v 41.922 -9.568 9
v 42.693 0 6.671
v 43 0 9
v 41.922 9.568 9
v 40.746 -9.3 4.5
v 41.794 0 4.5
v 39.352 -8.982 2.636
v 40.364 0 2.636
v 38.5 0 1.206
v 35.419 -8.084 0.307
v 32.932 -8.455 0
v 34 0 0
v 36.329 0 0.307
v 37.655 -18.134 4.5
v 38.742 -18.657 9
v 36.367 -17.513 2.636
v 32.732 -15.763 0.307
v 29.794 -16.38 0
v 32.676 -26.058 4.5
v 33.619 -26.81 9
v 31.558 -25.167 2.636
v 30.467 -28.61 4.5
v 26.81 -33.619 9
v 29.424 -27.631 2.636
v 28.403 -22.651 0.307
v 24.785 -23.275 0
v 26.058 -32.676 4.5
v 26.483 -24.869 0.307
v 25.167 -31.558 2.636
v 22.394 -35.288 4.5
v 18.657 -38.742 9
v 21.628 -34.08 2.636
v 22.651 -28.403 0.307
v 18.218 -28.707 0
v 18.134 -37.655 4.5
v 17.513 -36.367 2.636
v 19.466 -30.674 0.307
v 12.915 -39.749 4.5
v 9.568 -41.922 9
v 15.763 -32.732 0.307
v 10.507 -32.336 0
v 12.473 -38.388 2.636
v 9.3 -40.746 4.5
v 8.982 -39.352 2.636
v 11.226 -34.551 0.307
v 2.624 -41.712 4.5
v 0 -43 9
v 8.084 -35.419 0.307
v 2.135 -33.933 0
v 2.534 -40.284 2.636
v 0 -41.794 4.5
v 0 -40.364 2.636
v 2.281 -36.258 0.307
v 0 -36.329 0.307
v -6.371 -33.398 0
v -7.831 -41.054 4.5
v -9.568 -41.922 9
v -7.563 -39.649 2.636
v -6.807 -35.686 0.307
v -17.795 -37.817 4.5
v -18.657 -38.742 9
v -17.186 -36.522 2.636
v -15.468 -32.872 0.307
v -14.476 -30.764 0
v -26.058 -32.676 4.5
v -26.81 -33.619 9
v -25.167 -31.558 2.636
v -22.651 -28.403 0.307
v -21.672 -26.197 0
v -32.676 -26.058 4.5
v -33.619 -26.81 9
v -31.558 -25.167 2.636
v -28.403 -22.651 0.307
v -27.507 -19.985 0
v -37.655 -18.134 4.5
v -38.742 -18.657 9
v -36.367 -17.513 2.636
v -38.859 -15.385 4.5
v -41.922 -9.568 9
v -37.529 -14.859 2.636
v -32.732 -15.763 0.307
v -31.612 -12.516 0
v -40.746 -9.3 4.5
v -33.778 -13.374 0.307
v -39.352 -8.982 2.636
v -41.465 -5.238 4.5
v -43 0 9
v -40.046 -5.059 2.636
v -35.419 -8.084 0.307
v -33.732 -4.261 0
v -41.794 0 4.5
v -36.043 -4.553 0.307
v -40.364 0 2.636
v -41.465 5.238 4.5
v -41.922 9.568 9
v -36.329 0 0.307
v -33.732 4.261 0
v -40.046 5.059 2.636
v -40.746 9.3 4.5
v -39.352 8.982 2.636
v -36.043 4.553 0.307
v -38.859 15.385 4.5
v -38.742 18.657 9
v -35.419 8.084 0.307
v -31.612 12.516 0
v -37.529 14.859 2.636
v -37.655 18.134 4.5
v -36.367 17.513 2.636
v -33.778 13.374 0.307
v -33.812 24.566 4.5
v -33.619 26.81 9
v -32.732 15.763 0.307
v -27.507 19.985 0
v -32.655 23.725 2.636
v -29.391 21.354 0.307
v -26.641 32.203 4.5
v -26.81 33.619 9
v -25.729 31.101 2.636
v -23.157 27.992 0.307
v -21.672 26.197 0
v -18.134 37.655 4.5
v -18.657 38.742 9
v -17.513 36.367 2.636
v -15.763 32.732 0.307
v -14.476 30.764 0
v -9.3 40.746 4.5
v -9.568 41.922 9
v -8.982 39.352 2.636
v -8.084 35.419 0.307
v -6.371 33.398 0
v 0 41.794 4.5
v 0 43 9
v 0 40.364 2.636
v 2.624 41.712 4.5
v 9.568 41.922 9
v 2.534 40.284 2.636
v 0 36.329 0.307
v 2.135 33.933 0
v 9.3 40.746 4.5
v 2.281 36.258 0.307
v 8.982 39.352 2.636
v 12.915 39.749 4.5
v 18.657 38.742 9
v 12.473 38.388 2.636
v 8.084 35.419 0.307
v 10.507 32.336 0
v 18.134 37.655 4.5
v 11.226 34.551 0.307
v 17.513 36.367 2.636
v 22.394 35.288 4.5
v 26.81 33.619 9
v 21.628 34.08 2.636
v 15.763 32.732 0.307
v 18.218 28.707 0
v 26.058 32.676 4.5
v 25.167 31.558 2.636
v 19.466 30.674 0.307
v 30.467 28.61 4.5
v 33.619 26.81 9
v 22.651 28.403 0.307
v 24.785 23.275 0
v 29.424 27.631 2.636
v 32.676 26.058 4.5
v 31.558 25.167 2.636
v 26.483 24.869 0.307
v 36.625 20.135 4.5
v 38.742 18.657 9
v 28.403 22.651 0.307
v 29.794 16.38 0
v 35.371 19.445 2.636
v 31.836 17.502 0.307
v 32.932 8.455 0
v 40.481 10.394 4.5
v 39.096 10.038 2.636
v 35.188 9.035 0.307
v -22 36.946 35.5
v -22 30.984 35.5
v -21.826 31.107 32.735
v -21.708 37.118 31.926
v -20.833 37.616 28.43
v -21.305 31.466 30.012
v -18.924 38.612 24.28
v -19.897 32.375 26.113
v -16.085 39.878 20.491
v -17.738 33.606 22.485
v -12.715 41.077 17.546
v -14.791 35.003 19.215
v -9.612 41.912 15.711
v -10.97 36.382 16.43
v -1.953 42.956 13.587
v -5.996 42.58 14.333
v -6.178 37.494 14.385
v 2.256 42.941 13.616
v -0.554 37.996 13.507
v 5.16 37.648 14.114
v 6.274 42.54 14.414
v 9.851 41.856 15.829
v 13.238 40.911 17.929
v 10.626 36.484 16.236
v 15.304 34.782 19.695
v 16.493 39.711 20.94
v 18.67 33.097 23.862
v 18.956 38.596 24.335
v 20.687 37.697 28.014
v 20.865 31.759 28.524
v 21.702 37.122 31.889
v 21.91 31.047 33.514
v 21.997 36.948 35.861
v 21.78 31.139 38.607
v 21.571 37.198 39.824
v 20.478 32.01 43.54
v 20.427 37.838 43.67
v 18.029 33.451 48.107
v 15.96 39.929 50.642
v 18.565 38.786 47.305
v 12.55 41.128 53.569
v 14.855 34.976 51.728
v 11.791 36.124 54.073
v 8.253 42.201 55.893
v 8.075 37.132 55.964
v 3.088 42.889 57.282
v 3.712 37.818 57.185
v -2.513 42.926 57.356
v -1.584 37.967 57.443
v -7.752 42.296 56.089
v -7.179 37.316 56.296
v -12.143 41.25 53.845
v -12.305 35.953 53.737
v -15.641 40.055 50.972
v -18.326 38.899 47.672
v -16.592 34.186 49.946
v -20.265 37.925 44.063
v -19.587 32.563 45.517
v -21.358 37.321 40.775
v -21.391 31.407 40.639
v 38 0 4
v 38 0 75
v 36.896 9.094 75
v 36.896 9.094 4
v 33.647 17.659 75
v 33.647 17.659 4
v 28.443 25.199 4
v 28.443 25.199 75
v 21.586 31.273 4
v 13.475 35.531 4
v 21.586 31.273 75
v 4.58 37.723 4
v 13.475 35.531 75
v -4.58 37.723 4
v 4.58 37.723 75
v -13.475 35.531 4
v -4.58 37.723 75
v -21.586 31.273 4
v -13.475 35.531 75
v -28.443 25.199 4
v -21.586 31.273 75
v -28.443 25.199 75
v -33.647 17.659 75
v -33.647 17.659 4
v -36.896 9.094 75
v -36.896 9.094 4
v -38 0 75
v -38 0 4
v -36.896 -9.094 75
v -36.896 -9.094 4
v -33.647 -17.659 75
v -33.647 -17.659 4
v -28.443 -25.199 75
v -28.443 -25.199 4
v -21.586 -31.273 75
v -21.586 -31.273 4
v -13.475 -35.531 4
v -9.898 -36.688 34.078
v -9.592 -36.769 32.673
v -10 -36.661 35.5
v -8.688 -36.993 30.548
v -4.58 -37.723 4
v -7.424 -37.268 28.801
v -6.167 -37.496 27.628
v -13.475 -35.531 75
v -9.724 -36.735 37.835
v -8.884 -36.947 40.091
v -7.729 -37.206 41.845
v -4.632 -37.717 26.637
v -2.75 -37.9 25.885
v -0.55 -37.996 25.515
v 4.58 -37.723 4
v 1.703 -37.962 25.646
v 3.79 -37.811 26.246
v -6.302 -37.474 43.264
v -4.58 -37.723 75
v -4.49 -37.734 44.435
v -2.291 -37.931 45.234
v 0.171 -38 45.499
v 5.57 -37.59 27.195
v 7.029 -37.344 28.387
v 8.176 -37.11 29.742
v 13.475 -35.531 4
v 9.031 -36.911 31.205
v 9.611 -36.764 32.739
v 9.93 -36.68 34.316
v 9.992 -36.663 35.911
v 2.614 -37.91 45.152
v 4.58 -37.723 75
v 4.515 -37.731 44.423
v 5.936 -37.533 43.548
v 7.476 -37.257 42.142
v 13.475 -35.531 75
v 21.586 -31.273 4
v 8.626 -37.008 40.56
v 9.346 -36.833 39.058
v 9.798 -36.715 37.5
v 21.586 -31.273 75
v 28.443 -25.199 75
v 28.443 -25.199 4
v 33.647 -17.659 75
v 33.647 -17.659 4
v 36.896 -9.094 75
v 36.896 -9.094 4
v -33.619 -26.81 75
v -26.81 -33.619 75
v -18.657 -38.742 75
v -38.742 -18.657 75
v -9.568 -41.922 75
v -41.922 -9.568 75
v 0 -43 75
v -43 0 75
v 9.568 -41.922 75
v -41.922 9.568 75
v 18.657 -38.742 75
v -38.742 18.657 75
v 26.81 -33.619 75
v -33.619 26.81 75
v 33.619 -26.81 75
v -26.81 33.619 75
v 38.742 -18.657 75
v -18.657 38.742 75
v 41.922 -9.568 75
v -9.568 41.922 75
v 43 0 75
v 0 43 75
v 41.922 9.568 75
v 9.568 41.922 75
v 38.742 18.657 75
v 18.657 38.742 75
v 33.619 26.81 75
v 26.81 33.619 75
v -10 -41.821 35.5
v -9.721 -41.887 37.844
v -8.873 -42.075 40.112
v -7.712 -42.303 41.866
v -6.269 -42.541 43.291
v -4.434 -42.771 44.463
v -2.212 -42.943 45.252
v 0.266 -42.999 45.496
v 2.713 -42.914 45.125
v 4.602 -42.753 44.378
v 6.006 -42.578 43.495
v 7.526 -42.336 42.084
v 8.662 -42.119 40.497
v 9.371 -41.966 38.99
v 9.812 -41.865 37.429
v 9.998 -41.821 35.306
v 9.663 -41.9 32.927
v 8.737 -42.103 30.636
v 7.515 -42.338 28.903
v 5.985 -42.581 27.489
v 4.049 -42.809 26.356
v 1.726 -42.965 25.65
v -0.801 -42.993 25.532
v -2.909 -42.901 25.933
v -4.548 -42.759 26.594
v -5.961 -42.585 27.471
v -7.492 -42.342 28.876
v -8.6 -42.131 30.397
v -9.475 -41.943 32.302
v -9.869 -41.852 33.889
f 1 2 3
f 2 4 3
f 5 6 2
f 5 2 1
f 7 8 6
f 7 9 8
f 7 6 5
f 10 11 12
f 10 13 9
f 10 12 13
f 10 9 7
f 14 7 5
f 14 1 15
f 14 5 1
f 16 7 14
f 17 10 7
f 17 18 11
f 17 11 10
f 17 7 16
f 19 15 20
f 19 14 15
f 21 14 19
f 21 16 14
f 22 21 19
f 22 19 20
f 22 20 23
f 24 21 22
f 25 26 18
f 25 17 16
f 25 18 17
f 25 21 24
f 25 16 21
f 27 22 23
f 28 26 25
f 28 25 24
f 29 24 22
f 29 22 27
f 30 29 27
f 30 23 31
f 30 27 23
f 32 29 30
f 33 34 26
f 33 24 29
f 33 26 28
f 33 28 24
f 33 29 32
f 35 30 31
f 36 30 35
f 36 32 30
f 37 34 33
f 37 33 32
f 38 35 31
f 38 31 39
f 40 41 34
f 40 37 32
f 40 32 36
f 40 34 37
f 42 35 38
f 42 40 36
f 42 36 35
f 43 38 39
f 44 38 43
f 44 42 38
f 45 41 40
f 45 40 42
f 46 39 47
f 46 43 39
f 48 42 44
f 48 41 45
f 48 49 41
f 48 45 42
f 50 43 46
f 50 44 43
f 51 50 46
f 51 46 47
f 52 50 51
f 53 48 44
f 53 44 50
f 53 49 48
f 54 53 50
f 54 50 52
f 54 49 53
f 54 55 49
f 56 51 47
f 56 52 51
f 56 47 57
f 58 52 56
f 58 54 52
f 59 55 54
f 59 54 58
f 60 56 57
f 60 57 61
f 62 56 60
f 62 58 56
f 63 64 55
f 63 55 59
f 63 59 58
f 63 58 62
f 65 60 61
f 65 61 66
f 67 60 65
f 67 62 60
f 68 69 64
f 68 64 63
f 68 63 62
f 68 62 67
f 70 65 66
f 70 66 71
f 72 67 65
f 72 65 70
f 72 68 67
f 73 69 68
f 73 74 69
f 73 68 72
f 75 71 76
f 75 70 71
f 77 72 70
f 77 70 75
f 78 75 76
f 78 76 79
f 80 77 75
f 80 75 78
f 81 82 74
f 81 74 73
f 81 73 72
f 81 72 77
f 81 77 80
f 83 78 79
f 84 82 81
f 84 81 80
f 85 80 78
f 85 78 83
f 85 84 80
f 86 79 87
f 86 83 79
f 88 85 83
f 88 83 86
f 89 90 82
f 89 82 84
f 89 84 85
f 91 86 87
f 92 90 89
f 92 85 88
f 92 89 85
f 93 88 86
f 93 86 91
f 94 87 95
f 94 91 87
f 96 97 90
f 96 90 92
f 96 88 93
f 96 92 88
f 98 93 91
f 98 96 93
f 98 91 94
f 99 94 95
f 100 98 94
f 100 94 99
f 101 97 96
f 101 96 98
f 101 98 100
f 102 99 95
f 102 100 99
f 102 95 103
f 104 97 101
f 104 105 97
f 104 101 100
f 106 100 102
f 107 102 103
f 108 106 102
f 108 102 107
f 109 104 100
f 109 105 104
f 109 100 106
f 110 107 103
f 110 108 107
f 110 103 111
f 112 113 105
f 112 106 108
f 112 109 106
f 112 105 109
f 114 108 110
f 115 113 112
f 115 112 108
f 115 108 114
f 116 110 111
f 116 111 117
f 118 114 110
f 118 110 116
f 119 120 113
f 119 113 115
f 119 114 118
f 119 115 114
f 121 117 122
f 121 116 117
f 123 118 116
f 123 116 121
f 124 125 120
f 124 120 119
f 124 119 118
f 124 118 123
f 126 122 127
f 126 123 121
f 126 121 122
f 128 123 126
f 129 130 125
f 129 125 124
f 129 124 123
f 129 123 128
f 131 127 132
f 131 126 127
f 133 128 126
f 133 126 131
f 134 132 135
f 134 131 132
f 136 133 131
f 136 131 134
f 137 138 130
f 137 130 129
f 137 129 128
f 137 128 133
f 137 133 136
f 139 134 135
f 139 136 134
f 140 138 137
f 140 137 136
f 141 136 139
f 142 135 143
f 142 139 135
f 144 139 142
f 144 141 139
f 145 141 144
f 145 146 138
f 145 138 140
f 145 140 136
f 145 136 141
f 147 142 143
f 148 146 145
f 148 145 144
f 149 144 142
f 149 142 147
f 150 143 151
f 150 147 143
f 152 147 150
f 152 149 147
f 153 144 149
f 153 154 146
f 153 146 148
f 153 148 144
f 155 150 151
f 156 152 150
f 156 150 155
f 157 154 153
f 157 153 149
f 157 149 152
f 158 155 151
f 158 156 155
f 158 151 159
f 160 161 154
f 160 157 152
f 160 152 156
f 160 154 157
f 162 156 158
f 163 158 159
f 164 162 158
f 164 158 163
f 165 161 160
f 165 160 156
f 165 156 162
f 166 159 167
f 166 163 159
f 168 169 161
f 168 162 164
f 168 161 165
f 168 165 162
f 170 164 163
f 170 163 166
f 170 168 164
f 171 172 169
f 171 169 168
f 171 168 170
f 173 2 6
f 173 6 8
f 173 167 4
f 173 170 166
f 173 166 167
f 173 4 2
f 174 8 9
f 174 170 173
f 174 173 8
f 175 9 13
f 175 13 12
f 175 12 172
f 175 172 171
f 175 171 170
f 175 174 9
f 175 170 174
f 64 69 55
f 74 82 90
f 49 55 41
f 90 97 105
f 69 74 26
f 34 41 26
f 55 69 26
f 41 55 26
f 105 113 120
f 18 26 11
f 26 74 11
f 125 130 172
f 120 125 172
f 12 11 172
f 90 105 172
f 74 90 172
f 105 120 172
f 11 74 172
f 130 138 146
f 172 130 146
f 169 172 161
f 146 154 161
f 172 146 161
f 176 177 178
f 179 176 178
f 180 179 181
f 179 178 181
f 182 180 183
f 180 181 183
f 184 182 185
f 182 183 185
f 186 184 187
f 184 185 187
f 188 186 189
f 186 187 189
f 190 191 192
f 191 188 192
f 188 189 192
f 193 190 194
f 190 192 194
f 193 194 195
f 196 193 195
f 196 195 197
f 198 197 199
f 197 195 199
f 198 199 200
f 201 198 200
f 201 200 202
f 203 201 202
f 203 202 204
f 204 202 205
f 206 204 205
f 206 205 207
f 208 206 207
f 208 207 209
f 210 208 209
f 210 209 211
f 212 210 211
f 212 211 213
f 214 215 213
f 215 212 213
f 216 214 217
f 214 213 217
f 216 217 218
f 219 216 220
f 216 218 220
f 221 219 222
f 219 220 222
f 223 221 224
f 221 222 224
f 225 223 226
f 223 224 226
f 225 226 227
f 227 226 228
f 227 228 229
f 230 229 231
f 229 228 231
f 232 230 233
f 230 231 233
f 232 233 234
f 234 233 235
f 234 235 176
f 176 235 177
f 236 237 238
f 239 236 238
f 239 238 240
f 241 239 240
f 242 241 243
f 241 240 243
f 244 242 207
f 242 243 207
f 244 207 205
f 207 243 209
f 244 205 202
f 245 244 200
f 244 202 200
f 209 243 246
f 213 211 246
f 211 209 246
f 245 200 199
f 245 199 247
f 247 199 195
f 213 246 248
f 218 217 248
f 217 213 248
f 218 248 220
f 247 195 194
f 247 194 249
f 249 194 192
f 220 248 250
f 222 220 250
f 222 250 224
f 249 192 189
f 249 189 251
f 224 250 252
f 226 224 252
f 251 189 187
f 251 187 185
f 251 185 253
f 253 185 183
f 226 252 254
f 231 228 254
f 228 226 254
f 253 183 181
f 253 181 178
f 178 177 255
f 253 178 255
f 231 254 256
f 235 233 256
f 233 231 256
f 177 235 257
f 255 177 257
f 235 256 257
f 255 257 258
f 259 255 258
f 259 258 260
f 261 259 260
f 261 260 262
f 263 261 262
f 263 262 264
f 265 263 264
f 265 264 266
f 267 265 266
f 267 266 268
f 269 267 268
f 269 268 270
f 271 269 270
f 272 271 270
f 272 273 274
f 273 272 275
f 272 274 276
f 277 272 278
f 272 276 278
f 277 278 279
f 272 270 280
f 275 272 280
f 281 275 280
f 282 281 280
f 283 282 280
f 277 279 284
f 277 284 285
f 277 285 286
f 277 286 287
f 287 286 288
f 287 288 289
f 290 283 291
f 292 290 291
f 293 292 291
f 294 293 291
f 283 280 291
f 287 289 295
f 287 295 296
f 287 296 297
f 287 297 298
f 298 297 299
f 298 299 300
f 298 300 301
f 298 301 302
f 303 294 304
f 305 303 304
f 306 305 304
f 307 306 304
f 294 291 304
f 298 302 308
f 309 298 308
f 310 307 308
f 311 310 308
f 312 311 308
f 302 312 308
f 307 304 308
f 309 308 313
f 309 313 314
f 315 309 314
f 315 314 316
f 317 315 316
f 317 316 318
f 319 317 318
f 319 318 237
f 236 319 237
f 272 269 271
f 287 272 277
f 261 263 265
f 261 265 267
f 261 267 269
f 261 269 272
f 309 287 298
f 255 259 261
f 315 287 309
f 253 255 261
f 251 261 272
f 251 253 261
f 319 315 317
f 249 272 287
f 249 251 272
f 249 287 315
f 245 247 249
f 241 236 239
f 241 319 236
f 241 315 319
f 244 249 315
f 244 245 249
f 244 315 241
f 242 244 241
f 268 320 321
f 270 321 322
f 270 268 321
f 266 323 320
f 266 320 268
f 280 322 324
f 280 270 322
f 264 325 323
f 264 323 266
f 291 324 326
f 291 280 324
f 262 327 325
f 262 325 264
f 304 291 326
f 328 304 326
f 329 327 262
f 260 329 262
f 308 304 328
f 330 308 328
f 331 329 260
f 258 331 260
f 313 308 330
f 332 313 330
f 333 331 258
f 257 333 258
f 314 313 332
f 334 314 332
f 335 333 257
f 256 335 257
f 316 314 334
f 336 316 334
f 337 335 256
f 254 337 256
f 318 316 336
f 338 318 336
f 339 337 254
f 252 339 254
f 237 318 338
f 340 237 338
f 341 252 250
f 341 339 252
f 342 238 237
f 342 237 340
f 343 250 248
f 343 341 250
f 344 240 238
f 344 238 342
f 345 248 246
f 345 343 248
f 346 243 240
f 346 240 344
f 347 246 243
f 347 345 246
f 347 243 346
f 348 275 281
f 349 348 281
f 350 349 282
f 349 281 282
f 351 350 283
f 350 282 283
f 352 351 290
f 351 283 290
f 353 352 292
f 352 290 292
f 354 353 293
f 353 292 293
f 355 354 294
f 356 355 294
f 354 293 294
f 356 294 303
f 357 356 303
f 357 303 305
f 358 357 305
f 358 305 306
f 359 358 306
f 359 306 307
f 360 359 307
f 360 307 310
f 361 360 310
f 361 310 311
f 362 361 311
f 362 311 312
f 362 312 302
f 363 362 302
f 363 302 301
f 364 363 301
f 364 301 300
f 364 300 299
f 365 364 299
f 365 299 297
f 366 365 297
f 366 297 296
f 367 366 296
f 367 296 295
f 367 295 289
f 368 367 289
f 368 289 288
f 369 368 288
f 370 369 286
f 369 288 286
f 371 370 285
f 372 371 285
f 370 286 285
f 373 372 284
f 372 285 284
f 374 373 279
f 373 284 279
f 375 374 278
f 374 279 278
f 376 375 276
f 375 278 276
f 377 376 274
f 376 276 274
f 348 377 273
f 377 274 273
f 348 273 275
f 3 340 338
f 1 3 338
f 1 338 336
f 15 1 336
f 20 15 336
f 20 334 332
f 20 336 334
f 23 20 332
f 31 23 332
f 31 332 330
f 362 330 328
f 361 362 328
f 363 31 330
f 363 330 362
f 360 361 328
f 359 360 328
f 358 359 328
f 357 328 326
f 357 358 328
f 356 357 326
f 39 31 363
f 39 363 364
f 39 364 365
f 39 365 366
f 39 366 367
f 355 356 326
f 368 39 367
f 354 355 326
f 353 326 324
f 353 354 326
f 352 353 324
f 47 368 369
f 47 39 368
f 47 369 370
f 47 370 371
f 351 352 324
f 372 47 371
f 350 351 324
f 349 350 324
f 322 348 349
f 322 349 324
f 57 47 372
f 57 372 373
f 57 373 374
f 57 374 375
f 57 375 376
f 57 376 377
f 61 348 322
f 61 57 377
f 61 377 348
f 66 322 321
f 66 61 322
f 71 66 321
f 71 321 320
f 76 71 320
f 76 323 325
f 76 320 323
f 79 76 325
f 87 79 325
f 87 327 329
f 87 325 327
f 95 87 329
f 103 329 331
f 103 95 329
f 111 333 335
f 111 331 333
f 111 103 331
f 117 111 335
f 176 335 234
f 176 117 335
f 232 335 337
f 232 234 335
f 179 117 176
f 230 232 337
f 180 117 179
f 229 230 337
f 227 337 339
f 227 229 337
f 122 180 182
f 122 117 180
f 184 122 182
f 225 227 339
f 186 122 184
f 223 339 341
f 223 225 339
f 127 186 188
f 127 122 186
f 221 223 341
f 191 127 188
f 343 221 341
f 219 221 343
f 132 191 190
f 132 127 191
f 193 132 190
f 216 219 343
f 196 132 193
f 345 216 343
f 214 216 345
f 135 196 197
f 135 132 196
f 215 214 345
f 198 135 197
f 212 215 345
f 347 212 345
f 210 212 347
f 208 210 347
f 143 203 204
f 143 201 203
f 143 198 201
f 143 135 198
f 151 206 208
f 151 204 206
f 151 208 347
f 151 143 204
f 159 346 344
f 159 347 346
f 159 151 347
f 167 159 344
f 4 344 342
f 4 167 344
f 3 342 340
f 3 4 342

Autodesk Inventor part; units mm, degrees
ref_plane "XY Plane" through (0, 0, 0) normal (0, 0, 1) x (1, 0, 0)
sketch "Sketch1" plane through (0, 0, 0) normal (0, 0, 1) x (1, 0, 0)
  circle A0 centre (0, 0) radius 43
extrude "Extrusion1" add sketch "Sketch1" along normal blind 75
sketch "Sketch2" plane through (0, 0, 75) normal (0, 0, 1) x (1, 0, 0)
  circle A0 centre (0, 0) radius 38
  dimension "d4" = 76
extrude "Extrusion2" cut sketch "Sketch2" against normal blind 71
fillet "Fillet1" radius 9 1 edges at (-43, 0, 0)
sketch "Sketch3" plane through (0, 0, 0) normal (0, 1, 0) x (-1, 0, 0)
  circle A0 centre (0, 35.5) radius 10
  point P0 (0, 0)
  dimension "d8" = 20
  dimension "d11" = 35.5
extrude "Extrusion3" cut sketch "Sketch3" against normal through all
sketch "Sketch6" plane through (0, 0, 0) normal (0, 1, 0) x (-1, 0, 0)
  circle A0 centre (0, 35.5) radius 22
  line L0 (34, 0) -> (-34, 0) projected
  point P0 (0, 0)
  dimension "d12" = 44
  dimension "d13" = 35.5
extrude "Extrusion4" cut sketch "Sketch6" along normal up to next
properties part number "Cap"
